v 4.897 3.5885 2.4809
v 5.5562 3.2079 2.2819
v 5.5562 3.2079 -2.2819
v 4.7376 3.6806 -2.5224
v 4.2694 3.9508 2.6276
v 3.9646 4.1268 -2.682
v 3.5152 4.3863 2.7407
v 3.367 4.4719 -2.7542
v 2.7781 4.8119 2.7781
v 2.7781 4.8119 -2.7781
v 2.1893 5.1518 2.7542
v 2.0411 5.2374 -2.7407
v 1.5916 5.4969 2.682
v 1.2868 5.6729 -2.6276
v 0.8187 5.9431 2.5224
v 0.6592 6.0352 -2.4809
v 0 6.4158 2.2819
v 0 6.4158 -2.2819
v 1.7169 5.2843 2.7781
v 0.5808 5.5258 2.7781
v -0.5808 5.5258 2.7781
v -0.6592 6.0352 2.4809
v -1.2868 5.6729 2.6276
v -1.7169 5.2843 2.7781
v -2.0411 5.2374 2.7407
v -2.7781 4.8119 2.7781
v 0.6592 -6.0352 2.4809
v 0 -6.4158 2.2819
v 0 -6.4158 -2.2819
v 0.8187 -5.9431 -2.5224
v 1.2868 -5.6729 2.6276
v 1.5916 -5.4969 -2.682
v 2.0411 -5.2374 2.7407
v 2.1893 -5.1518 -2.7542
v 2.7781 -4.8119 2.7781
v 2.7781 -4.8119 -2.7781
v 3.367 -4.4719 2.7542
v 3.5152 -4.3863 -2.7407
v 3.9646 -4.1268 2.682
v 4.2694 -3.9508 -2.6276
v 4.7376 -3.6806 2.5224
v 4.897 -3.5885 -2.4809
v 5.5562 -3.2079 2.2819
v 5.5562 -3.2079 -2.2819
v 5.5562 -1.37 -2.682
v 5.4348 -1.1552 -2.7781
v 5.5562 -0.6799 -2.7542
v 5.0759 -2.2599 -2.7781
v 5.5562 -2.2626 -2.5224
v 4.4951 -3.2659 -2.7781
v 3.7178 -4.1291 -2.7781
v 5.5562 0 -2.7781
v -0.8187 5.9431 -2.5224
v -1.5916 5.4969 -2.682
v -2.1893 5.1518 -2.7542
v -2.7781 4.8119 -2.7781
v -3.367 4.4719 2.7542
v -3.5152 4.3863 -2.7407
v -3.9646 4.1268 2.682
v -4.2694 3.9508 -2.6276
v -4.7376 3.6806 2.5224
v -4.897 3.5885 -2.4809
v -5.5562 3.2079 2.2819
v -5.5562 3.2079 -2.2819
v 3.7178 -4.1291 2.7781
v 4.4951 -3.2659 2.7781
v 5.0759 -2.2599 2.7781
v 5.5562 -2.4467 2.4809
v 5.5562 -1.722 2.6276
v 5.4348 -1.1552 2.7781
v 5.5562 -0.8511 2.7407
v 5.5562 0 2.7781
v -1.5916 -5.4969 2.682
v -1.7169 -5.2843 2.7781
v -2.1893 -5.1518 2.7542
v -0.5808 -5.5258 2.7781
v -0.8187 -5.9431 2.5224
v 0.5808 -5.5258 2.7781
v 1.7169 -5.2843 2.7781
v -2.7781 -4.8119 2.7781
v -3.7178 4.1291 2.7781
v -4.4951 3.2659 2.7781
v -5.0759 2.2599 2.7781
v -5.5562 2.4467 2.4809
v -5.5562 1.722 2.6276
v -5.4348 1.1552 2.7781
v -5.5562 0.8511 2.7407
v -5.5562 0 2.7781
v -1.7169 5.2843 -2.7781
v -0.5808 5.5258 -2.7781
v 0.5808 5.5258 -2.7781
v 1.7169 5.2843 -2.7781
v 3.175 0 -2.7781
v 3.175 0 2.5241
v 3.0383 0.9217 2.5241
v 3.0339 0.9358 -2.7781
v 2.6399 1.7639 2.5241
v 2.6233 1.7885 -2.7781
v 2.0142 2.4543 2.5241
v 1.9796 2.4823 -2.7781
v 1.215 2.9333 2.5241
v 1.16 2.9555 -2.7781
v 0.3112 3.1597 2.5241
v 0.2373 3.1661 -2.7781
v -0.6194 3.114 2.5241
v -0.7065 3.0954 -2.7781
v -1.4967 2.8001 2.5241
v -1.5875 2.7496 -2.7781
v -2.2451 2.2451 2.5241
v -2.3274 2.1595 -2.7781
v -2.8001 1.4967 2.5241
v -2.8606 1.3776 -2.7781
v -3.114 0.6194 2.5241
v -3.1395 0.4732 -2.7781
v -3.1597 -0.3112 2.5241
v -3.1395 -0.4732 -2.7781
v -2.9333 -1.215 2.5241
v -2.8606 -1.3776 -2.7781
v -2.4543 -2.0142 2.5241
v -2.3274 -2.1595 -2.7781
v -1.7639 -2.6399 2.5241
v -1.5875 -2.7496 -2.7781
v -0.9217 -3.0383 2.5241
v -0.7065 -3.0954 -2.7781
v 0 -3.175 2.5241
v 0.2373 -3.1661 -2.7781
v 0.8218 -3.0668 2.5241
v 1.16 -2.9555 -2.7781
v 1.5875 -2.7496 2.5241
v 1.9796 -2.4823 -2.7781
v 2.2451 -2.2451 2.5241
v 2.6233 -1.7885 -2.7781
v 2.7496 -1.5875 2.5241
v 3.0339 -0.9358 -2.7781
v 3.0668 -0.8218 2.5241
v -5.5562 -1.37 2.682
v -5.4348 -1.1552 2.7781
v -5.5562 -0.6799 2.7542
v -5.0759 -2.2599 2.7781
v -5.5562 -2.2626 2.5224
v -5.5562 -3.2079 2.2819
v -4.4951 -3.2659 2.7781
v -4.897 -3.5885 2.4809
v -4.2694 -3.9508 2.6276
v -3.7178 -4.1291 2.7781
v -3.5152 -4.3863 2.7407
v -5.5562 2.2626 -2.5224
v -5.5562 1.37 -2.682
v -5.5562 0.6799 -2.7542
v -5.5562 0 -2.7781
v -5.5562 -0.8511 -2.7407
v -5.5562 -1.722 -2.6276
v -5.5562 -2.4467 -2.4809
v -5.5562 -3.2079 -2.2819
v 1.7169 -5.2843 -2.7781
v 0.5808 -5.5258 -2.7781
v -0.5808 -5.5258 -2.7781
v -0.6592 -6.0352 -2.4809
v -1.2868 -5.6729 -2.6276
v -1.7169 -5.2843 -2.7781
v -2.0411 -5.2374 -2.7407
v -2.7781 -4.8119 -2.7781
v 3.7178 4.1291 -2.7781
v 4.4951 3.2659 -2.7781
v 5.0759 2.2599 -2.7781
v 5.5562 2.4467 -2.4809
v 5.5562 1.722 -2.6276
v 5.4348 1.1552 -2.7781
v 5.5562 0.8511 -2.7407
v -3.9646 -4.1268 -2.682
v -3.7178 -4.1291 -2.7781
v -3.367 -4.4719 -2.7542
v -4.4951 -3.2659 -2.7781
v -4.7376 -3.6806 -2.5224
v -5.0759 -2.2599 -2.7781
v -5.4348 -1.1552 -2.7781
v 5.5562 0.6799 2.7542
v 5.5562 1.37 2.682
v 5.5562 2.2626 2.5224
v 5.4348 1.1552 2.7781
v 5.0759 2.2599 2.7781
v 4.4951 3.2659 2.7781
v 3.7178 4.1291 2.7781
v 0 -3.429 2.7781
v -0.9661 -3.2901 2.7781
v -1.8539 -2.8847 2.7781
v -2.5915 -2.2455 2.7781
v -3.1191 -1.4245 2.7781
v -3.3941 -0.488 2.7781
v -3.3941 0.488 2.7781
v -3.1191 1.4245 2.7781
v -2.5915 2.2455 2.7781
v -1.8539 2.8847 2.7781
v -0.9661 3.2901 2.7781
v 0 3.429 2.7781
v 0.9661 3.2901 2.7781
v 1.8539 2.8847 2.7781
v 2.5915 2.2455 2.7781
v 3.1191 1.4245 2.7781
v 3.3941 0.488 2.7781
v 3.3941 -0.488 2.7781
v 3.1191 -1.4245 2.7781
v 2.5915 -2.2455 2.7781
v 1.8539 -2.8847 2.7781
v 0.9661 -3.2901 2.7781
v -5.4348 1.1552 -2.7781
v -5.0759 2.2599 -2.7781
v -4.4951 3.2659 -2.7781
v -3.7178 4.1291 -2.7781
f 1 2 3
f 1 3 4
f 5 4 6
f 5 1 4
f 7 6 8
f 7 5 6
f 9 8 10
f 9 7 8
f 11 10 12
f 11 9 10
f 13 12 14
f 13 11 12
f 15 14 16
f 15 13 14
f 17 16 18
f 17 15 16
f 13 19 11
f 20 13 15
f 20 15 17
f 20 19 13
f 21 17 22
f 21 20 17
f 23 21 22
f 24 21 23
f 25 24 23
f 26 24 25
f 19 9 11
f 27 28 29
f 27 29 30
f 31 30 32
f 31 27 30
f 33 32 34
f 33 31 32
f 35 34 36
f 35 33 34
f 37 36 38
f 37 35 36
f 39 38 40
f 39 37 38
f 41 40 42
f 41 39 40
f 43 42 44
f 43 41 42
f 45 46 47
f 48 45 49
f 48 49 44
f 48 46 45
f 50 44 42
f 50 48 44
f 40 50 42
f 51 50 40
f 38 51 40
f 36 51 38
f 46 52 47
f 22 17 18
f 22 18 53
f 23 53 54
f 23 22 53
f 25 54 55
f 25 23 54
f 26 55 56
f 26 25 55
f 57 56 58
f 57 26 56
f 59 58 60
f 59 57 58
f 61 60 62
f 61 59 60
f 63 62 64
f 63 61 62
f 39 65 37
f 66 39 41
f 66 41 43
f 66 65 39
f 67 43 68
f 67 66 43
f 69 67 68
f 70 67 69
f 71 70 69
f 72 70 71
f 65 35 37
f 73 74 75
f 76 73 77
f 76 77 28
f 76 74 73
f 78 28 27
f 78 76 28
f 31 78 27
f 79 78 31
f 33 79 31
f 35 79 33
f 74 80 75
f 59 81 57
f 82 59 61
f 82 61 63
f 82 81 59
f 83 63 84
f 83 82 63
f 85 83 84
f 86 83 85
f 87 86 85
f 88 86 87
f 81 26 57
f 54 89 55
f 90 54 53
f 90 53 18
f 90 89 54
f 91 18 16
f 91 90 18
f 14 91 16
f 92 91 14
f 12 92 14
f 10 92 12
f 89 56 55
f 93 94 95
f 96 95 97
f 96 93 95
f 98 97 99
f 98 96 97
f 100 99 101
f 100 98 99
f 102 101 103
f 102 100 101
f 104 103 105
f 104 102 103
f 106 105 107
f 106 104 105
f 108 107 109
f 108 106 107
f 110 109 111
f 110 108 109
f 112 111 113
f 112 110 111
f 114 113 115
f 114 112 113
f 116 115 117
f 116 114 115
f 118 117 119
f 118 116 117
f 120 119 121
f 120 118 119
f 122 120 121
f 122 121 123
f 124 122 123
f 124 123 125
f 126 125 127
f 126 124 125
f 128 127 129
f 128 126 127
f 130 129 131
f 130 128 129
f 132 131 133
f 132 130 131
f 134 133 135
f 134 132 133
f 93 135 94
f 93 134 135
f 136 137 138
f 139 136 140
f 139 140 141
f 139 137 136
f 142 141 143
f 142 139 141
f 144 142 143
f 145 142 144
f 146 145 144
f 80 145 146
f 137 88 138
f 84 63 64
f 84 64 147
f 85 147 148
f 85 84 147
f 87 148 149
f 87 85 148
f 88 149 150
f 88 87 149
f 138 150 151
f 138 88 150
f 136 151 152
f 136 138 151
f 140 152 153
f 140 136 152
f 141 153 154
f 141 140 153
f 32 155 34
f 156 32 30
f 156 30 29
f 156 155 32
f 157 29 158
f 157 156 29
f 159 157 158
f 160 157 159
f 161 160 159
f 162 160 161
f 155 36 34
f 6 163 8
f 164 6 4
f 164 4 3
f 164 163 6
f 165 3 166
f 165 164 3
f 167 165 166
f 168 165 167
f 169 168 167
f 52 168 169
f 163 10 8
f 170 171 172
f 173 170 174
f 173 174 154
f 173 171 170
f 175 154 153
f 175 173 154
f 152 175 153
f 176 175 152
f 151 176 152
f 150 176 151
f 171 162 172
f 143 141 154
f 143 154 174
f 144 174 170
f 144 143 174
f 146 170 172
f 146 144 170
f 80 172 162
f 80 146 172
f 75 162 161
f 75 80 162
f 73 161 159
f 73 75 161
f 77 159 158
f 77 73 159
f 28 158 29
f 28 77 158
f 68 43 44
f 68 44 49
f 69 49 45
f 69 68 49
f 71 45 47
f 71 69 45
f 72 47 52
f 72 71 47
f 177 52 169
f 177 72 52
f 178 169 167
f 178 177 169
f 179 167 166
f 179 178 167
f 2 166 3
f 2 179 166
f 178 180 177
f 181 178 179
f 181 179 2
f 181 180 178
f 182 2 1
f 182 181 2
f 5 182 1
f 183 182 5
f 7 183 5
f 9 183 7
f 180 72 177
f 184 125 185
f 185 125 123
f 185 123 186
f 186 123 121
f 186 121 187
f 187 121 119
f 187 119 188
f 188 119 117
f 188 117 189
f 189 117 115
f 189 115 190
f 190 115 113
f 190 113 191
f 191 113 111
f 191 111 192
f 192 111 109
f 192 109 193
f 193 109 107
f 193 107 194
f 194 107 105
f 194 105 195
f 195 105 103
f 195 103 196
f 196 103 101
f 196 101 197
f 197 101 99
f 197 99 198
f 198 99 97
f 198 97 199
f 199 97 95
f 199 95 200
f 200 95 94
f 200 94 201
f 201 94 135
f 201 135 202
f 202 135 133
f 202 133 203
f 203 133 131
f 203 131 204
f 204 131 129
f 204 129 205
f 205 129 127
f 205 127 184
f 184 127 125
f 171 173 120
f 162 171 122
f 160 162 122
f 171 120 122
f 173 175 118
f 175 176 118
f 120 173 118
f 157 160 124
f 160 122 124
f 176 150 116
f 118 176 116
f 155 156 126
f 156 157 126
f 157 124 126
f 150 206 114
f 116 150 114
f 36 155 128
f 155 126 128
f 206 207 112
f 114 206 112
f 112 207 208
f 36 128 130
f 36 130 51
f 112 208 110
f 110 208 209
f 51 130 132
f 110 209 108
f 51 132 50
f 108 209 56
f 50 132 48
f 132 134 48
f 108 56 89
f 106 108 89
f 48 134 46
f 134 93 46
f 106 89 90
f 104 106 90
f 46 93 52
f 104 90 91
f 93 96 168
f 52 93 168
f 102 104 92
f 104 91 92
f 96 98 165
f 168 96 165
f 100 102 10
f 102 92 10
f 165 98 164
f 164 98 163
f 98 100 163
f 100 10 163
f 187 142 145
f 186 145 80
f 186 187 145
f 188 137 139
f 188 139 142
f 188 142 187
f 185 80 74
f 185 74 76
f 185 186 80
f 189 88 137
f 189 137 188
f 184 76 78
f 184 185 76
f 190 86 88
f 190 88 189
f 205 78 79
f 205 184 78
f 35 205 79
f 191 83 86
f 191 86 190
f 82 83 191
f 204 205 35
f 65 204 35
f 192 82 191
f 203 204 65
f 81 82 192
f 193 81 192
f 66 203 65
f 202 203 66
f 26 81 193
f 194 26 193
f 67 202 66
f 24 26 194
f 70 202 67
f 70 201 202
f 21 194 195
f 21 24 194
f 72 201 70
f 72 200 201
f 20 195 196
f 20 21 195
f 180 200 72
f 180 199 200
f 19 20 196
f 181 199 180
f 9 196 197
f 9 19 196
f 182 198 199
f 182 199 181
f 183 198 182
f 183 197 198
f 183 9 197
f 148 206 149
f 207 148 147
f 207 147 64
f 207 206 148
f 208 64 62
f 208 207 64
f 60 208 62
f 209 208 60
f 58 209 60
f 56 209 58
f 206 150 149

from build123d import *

# Parameters (mm, degrees)
SKETCH1_R               = 3.175
EXTRUDE1_DEPTH          = 2.778125
SKETCH9_OUTSIDE_W       = 55.29
SKETCH9_OUTSIDE_H       = 57.01
SKETCH9_OUTSIDE_R       = 5.55625
CUT_EXTRUDE2_DEPTH      = 11.1442782
CUT_EXTRUDE2_DRAFT      = -60
MIRROR2_COPY_1_SKETCH_W = 55.29
MIRROR2_COPY_1_SKETCH_H = 57.01
MIRROR2_COPY_1_SKETCH_R = 5.55625
MIRROR2_COPY_1_DEPTH    = 11.1442782
MIRROR2_COPY_1_DRAFT    = -60


with BuildPart() as part:
    # Sketch1 → Extrude1 (new, symmetric)
    with BuildSketch(Plane.XY):
        Polygon((-5.55625, 3.207902433), (-5.55625, -3.207902433), (0, -6.415804866), (5.55625, -3.207902433), (5.55625, 3.207902433), (0, 6.415804866), align=None)
        Circle(SKETCH1_R, mode=Mode.SUBTRACT)
    extrude(amount=EXTRUDE1_DEPTH, both=True)


with BuildPart() as cut_extrude2_tool:
    # Sketch9 outside → Cut-Extrude2 (with draft: the straight prism first)
    with BuildSketch(Plane.XY.offset(2.778125)):
        Rectangle(SKETCH9_OUTSIDE_W, SKETCH9_OUTSIDE_H)
        Circle(SKETCH9_OUTSIDE_R, mode=Mode.SUBTRACT)
    extrude(amount=-CUT_EXTRUDE2_DEPTH)
    # Cut-Extrude2: the draft: its side faces are tilted about the plane it starts from
    cut_extrude2_sides = [cut_extrude2_tool.faces().sort_by_distance(p)[0] for p in [
        (0, -28.505, -2.7940141),
        (27.645, 0, -2.7940141),
        (0, 28.505, -2.7940141),
        (-27.645, 0, -2.7940141),
        (-5.55625, 0, -2.7940141),
    ]]
    draft(cut_extrude2_sides, Plane.XY.offset(2.778125), CUT_EXTRUDE2_DRAFT)


with BuildPart() as part_1:
    add(part.part)

    # Cut-Extrude2: cut by cut_extrude2_tool
    add(cut_extrude2_tool.part, mode=Mode.SUBTRACT)


with BuildPart() as mirror2_copy_1_tool:
    # Mirror2 copy 1 sketch → Mirror2 copy 1 (with draft: the straight prism first)
    with BuildSketch(Plane(origin=(0, 0, -2.778125), x_dir=(1, 0, 0), z_dir=(0, 0, -1))):
        Rectangle(MIRROR2_COPY_1_SKETCH_W, MIRROR2_COPY_1_SKETCH_H)
        Circle(MIRROR2_COPY_1_SKETCH_R, mode=Mode.SUBTRACT)
    extrude(amount=-MIRROR2_COPY_1_DEPTH)
    # Mirror2 copy 1: the draft: its side faces are tilted about the plane it starts from
    mirror2_copy_1_sides = [mirror2_copy_1_tool.faces().sort_by_distance(p)[0] for p in [
        (0, -28.505, 2.7940141),
        (27.645, 0, 2.7940141),
        (0, 28.505, 2.7940141),
        (-27.645, 0, 2.7940141),
        (-5.55625, 0, 2.7940141),
    ]]
    draft(mirror2_copy_1_sides, Plane(origin=(0, 0, -2.778125), x_dir=(1, 0, 0), z_dir=(0, 0, -1)), MIRROR2_COPY_1_DRAFT)


with BuildPart() as part_2:
    add(part_1.part)

    # Mirror2 copy 1: cut by mirror2_copy_1_tool
    add(mirror2_copy_1_tool.part, mode=Mode.SUBTRACT)

    # Cut-Extrude10 cone 1 section (through the dimple's axis) → Cut-Extrude10 (revolve, cut)
    with BuildSketch(Plane(origin=(0, 0, 2.778125), x_dir=(0, -1, 0), z_dir=(1, 0, 0))):
        Polygon((0, 0), (3.429, 0), (0, 3.429), align=None)
    revolve(axis=Axis((0, 0, 2.778125), (0, 0, -1)), mode=Mode.SUBTRACT)


solid = part_2.part
